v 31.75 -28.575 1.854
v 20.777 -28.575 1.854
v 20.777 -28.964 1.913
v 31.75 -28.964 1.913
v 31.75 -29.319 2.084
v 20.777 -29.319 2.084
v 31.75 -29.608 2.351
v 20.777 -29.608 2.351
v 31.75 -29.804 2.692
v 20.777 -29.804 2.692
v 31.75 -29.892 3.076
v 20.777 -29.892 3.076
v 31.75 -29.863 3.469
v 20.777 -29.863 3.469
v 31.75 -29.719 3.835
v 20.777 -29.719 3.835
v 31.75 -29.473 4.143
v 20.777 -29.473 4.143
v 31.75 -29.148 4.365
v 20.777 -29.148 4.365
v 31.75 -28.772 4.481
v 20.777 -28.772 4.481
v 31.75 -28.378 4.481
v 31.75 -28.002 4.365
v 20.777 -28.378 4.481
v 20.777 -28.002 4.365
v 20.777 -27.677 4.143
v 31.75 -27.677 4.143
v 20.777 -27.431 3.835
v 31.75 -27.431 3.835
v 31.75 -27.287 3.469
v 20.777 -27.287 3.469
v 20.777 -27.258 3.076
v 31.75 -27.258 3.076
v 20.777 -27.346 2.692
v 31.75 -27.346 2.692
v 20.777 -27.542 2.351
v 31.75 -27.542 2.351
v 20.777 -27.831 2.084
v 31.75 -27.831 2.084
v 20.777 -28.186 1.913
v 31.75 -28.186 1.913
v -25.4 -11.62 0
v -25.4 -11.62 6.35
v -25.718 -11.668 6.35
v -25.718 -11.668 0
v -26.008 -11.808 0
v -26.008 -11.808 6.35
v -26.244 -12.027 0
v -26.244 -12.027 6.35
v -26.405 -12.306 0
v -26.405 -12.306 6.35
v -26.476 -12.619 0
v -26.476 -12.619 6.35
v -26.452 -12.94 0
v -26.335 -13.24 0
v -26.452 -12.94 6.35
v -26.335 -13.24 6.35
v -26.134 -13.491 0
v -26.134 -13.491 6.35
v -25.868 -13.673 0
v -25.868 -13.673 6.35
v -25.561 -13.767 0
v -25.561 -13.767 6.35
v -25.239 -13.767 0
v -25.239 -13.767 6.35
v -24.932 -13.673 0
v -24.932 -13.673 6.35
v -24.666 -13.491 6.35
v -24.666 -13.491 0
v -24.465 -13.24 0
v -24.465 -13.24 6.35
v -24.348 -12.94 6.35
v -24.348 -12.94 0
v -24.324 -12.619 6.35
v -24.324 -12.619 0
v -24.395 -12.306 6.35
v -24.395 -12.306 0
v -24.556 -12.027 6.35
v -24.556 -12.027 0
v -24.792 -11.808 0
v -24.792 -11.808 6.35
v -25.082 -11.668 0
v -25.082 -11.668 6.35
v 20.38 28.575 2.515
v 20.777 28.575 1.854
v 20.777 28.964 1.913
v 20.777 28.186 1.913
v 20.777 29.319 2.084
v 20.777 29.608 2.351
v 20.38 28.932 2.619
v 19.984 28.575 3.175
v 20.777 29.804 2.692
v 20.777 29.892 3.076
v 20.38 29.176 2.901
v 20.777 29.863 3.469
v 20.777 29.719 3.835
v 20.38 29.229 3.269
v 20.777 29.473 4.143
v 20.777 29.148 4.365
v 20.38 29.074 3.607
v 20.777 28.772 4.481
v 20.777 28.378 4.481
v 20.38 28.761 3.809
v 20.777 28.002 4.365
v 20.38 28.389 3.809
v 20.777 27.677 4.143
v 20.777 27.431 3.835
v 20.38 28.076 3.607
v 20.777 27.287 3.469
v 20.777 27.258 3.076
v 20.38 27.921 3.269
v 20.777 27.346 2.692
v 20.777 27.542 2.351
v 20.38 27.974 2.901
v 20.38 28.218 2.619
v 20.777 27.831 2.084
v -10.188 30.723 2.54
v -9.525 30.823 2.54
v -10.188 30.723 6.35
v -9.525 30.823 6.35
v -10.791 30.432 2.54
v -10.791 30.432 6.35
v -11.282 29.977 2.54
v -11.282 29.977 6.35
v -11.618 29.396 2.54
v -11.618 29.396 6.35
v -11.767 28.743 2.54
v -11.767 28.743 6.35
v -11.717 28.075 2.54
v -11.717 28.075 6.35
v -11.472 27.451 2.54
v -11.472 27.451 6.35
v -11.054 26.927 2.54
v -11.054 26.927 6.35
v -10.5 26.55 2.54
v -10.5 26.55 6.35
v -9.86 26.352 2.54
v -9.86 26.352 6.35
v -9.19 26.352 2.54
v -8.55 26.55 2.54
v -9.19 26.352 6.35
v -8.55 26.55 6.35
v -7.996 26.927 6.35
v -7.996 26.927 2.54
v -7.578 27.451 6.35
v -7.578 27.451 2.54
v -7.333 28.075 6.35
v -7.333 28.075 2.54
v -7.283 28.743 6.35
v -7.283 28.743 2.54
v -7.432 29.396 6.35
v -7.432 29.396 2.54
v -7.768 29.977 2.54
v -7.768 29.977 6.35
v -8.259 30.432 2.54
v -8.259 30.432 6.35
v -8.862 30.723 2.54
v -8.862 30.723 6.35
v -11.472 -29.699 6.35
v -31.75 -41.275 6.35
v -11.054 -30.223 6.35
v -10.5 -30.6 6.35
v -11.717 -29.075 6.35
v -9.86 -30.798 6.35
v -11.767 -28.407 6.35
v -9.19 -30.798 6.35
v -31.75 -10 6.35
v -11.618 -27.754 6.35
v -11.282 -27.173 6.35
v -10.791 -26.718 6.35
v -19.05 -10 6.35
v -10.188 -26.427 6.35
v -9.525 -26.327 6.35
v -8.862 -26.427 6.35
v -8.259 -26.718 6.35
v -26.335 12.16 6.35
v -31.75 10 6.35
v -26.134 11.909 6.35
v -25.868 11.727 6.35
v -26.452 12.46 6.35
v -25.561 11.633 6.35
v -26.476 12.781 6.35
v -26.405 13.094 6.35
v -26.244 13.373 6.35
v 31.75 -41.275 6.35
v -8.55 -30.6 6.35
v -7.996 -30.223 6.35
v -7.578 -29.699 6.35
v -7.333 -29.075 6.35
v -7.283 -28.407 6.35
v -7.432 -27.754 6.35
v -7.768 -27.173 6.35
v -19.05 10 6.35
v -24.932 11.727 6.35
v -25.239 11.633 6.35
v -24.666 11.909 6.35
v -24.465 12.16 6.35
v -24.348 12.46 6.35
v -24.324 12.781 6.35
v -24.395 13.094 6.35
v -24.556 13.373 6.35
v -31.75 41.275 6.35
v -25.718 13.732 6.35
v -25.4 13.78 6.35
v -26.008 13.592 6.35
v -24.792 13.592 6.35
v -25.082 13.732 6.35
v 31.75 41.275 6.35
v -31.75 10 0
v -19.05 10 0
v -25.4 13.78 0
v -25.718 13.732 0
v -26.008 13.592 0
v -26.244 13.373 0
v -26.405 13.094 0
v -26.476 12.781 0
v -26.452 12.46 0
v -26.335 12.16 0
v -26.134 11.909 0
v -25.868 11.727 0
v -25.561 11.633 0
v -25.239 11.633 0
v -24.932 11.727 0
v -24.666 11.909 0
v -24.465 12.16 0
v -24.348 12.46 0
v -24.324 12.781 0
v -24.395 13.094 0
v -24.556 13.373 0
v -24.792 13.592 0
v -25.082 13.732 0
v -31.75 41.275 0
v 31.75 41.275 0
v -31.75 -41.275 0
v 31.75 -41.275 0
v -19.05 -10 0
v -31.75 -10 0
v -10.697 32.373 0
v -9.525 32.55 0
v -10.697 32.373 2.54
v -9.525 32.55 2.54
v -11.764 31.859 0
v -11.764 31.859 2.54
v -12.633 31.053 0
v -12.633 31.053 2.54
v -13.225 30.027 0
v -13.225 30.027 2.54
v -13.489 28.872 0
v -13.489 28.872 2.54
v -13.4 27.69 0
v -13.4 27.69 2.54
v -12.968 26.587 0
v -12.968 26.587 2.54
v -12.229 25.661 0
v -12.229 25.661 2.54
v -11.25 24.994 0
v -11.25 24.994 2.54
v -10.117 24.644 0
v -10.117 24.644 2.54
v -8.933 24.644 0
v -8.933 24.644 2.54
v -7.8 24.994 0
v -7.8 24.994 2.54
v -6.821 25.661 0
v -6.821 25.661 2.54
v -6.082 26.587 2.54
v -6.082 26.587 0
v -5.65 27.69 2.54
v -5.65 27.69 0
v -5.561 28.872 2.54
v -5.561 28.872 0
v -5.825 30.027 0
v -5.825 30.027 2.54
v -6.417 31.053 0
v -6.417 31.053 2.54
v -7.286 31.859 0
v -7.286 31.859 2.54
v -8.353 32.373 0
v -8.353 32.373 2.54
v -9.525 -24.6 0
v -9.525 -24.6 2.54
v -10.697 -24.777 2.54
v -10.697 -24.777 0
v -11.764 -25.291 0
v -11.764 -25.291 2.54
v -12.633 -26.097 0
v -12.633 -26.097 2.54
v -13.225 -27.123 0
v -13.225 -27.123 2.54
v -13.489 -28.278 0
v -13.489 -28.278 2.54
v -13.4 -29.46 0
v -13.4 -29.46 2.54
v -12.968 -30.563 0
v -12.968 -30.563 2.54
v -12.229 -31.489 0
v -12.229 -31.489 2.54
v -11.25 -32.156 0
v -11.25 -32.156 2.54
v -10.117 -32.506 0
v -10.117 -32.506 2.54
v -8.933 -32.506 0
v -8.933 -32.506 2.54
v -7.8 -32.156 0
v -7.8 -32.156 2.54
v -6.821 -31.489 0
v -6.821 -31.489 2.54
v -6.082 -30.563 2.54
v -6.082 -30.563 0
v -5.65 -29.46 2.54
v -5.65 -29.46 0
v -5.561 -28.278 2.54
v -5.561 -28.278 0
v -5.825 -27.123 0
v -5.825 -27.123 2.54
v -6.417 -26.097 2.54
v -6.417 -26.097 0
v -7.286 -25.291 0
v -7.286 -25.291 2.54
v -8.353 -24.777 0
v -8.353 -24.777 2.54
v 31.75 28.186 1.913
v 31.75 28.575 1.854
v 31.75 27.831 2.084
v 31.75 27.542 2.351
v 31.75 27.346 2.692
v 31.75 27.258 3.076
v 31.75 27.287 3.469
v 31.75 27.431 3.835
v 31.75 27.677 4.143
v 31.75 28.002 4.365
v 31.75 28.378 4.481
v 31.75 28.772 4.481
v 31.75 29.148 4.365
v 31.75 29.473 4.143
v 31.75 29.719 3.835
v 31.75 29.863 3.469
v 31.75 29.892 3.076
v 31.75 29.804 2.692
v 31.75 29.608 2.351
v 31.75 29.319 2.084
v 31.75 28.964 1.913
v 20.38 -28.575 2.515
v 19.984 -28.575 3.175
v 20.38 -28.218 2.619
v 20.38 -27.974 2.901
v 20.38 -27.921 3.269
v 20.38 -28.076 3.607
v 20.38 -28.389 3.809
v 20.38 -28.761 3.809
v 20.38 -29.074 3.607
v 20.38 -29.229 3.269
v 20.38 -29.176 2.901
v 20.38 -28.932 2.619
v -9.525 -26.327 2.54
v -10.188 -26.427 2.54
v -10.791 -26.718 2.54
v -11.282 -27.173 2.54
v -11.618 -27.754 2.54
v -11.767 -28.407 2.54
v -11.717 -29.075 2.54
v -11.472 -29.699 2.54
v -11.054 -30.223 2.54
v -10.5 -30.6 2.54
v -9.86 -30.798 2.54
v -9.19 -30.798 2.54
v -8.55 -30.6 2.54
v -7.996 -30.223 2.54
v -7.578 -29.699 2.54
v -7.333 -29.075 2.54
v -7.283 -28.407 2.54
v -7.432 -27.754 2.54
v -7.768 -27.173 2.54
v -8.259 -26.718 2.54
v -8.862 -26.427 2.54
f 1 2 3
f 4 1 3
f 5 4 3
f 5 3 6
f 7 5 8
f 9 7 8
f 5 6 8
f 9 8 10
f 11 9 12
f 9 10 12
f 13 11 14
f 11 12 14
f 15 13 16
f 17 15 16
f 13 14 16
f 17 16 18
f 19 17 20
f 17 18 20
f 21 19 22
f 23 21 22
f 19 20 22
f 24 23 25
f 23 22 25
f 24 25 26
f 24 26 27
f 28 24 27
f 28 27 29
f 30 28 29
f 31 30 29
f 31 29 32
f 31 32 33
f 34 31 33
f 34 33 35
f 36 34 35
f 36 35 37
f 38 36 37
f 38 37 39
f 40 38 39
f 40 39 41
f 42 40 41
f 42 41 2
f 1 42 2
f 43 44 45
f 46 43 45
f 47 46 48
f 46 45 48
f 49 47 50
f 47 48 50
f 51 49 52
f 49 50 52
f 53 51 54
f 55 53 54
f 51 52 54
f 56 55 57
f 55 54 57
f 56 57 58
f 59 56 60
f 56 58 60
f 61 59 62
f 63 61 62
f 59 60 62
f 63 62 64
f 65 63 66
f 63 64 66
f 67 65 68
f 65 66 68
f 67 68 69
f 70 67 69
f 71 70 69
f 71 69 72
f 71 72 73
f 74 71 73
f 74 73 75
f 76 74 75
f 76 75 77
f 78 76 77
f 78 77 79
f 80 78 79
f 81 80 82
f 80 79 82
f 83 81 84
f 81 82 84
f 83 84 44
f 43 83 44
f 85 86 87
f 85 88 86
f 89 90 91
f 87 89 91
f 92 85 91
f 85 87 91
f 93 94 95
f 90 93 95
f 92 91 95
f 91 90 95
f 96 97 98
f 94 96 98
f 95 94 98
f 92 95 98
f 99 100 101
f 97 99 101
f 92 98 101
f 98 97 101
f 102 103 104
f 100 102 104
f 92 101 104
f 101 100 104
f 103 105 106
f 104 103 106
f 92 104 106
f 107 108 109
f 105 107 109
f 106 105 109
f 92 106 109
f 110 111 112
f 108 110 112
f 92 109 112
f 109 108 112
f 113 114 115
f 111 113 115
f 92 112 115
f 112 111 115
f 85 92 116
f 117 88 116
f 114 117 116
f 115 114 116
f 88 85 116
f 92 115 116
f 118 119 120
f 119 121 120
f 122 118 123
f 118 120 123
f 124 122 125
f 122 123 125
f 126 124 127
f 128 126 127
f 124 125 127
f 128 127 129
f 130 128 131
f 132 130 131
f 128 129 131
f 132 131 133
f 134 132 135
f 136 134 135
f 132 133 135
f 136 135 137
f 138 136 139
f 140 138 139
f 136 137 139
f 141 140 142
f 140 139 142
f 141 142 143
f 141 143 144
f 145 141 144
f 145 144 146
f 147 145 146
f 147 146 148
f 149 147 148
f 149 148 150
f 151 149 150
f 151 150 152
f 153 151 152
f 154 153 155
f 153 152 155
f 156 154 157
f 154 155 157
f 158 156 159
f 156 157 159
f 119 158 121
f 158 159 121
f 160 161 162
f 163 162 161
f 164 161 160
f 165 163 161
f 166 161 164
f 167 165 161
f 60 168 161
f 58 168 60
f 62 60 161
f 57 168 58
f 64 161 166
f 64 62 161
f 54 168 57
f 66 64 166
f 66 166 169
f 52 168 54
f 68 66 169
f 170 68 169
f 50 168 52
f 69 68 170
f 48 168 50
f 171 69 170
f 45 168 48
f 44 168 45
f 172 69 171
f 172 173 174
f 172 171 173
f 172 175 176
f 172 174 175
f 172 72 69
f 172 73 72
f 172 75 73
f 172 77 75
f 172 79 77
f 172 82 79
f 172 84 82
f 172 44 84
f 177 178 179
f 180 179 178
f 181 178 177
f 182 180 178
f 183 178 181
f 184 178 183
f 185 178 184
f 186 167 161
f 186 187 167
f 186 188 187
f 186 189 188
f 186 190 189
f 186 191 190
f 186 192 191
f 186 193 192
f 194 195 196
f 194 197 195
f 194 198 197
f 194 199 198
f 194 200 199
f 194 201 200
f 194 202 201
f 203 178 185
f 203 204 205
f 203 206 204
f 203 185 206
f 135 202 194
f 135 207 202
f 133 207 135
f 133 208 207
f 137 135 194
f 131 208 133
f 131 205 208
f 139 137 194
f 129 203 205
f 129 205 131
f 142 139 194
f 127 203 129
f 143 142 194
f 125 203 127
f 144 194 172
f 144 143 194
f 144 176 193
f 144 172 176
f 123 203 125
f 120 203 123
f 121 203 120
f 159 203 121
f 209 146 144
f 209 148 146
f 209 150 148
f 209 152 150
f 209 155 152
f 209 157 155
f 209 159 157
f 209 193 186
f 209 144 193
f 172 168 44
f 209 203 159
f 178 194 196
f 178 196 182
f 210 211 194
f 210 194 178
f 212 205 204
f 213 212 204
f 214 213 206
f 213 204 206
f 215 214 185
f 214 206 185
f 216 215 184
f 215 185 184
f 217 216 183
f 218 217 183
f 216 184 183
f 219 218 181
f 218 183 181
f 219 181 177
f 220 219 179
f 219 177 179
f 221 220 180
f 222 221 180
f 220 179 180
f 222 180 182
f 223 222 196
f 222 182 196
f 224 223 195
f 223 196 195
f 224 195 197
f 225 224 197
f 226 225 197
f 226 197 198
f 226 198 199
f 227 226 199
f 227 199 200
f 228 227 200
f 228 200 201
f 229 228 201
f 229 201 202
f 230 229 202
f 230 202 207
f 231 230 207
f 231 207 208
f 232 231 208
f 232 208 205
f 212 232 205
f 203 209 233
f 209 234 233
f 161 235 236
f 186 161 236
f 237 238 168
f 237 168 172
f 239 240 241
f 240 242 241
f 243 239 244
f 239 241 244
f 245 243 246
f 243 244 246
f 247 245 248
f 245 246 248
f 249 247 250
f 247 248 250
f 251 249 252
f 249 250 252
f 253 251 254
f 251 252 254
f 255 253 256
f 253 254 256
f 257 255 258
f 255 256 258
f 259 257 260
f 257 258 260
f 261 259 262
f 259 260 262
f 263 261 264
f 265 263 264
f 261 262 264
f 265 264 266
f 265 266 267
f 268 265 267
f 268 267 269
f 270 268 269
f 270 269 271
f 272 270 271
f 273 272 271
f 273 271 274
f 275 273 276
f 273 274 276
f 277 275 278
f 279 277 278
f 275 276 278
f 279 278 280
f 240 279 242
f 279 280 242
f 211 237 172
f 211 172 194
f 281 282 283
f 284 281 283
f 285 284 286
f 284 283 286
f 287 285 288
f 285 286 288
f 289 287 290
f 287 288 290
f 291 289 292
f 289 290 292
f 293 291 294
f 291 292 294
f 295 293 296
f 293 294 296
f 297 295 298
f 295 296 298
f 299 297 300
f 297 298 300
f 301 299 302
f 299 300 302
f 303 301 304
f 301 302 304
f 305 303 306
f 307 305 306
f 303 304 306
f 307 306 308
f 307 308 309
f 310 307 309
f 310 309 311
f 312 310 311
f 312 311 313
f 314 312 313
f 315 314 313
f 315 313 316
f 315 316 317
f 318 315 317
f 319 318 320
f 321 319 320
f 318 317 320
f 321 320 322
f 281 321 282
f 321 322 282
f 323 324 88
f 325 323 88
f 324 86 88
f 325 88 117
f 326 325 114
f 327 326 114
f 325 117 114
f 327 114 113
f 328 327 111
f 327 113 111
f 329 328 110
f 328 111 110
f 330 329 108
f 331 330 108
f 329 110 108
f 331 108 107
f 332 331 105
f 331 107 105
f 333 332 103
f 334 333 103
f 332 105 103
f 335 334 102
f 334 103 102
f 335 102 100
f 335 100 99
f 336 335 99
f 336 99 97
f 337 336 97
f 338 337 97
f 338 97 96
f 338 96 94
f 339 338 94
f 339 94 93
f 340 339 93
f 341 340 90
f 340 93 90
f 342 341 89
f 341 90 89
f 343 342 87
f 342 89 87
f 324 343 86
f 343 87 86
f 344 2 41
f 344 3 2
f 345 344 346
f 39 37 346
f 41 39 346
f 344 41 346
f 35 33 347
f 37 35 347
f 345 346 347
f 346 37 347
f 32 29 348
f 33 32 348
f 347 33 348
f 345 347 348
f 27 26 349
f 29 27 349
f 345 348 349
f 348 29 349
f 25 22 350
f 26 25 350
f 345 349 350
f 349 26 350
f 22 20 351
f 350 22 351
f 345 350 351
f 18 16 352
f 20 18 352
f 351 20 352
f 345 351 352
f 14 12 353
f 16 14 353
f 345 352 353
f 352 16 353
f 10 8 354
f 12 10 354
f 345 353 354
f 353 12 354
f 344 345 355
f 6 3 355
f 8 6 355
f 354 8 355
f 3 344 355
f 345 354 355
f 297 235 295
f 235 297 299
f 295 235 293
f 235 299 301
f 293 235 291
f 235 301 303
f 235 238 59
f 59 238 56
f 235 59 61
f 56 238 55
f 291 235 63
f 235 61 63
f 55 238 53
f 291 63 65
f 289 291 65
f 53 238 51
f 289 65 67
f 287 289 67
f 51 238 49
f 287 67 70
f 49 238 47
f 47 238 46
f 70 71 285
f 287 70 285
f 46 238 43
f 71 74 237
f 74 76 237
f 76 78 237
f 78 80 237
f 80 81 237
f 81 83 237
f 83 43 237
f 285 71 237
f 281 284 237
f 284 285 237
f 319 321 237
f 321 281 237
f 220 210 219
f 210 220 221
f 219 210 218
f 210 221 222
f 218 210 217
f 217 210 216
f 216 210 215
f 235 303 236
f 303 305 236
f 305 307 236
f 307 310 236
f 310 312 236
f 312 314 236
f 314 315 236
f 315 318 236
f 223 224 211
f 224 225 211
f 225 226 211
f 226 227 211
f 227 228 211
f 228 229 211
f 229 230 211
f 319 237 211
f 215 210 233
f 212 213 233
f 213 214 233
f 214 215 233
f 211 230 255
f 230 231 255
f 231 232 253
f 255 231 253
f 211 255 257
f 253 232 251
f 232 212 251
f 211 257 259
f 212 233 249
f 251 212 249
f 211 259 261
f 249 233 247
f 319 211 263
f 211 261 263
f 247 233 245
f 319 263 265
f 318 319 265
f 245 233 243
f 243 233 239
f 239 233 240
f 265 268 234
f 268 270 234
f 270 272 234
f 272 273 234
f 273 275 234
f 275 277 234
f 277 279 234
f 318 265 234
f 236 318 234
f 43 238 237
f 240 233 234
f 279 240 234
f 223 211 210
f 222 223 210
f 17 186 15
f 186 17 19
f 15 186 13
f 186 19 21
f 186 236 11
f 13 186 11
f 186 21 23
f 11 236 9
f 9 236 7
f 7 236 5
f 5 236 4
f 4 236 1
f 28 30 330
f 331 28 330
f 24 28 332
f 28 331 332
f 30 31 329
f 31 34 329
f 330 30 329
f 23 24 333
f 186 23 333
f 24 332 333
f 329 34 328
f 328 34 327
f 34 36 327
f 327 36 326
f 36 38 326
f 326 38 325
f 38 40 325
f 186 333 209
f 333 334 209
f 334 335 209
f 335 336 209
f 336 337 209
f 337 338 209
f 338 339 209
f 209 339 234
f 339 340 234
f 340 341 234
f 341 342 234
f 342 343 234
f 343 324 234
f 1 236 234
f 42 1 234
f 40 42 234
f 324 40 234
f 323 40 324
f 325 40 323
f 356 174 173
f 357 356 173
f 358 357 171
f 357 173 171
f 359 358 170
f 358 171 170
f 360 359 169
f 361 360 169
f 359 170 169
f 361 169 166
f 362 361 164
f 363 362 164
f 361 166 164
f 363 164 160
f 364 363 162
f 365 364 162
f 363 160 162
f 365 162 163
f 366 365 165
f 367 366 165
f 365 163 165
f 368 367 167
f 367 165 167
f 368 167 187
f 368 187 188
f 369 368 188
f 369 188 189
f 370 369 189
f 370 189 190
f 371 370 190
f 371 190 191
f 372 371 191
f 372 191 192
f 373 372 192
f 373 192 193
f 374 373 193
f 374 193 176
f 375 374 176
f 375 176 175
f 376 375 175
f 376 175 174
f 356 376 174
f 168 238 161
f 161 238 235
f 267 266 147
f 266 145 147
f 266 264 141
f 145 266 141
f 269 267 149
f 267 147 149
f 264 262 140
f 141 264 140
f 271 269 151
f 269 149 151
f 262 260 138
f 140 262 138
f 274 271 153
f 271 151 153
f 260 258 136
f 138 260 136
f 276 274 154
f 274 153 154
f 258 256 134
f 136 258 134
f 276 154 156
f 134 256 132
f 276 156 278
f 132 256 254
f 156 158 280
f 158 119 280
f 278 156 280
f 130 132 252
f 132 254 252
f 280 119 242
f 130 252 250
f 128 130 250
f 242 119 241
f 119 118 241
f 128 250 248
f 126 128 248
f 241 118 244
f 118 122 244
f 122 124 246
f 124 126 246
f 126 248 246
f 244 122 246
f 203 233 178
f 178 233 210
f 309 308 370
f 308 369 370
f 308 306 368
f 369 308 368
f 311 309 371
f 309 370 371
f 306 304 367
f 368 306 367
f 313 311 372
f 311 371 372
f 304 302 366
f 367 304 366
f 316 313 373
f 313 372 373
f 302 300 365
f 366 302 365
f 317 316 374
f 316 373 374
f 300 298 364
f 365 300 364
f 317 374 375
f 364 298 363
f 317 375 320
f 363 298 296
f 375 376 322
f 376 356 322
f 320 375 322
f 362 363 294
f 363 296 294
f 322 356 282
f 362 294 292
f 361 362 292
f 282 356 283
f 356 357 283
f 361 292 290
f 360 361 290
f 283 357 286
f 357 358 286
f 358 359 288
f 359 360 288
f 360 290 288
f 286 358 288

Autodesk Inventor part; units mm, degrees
ref_plane "YZ Plane" through (0, 0, 0) normal (1, 0, 0) x (0, 1, 0)
ref_plane "XZ Plane" through (0, 0, 0) normal (0, 1, 0) x (-1, 0, 0)
ref_plane "XY Plane" through (0, 0, 0) normal (0, 0, 1) x (1, 0, 0)
sketch "Sketch1" plane through (0, 0, 0) normal (0, 0, 1) x (1, 0, 0)
  line L0 (-31.75, -41.275) -> (31.75, -41.275)
  line L1 (31.75, -41.275) -> (31.75, 41.275)
  line L2 (31.75, 41.275) -> (-31.75, 41.275)
  line L3 (-31.75, 41.275) -> (-31.75, -41.275)
  line L4 (-31.75, -41.275) -> (31.75, 41.275) construction
  line L5 (31.75, -41.275) -> (-31.75, 41.275) construction
  point P0 (0, 0)
  dimension "d0" = 63.5
  dimension "d1" = 82.55
extrude "Extrusion1" add sketch "Sketch1" along normal blind 6.35
sketch "Sketch2" plane through (0, 0, 0) normal (0, 0, -1) x (-1, 0, 0)
  line L0 (44.45, -10) -> (19.05, -10)
  line L1 (19.05, -10) -> (19.05, 10)
  line L2 (19.05, 10) -> (44.45, 10)
  line L3 (44.45, 10) -> (44.45, -10)
  line L4 (31.75, 41.275) -> (31.75, -41.275) projected
  line L5 (44.45, -10) -> (19.05, 10) construction
  line L6 (19.05, -10) -> (44.45, 10) construction
  point P0 (0, 0)
  point P1 (31.75, 0)
  dimension "d4" = 25.4
  dimension "d5" = 20
extrude "Extrusion2" cut sketch "Sketch2" against normal blind 6.35
sketch "Sketch3" plane through (0, 0, 0) normal (0, 0, -1) x (-1, 0, 0)
  line L0 (25.4, 12.7) -> (25.4, -12.7)
  line L1 (31.75, 41.275) -> (31.75, 10) projected
  point P0 (0, 0)
  dimension "d8" = 12.7
  dimension "d9" = 25.4
  dimension "d10" = 6.35
hole "Hole1" at (-25.4, 12.7, 0) at (-25.4, -12.7, 0) direction (0, 0, 1) diameter 2.159 end through all
sketch "Sketch4" plane through (0, 0, 0) normal (0, 0, -1) x (-1, 0, 0)
  line L0 (9.525, 28.575) -> (9.525, -28.575)
  line L1 (-31.75, 41.275) -> (31.75, 41.275) projected
  line L2 (19.05, -10) -> (19.05, 10) projected
  point P0 (0, 0)
  dimension "d18" = 57.15
  dimension "d19" = 12.7
  dimension "d20" = 9.525
hole "Hole2" at (-9.525, 28.575, 0) at (-9.525, -28.575, 0) direction (0, 0, 1) diameter 4.4958 depth 12.2936 tip angle 118 counterbore diameter 7.9502 counterbore depth 2.54 clearance for "Socket Head Cap Screw" size "#8" standard "Ansi Unified Screw Threads"
sketch "Sketch5" plane through (31.75, -41.275, 0) normal (1, 0, 0) x (0, 0, -1)
  line L0 (-3.175, 69.85) -> (-3.175, 12.7)
  line L1 (-6.35, 0) -> (-6.35, 82.55) projected
  line L2 (0, 82.55) -> (-6.35, 82.55) projected
  point P0 (0, 41.275)
  dimension "d28" = 57.15
  dimension "d29" = 12.7
  dimension "d30" = 3.175
hole "Hole3" at (31.75, 28.575, 3.175) at (31.75, -28.575, 3.175) direction (-1, 0, 0) diameter 2.6416 depth 10.9728 tip angle 118 thread size "6-32 UNC" class "2B" standard "ANSI Unified Screw Threads"
properties part number "left side"
